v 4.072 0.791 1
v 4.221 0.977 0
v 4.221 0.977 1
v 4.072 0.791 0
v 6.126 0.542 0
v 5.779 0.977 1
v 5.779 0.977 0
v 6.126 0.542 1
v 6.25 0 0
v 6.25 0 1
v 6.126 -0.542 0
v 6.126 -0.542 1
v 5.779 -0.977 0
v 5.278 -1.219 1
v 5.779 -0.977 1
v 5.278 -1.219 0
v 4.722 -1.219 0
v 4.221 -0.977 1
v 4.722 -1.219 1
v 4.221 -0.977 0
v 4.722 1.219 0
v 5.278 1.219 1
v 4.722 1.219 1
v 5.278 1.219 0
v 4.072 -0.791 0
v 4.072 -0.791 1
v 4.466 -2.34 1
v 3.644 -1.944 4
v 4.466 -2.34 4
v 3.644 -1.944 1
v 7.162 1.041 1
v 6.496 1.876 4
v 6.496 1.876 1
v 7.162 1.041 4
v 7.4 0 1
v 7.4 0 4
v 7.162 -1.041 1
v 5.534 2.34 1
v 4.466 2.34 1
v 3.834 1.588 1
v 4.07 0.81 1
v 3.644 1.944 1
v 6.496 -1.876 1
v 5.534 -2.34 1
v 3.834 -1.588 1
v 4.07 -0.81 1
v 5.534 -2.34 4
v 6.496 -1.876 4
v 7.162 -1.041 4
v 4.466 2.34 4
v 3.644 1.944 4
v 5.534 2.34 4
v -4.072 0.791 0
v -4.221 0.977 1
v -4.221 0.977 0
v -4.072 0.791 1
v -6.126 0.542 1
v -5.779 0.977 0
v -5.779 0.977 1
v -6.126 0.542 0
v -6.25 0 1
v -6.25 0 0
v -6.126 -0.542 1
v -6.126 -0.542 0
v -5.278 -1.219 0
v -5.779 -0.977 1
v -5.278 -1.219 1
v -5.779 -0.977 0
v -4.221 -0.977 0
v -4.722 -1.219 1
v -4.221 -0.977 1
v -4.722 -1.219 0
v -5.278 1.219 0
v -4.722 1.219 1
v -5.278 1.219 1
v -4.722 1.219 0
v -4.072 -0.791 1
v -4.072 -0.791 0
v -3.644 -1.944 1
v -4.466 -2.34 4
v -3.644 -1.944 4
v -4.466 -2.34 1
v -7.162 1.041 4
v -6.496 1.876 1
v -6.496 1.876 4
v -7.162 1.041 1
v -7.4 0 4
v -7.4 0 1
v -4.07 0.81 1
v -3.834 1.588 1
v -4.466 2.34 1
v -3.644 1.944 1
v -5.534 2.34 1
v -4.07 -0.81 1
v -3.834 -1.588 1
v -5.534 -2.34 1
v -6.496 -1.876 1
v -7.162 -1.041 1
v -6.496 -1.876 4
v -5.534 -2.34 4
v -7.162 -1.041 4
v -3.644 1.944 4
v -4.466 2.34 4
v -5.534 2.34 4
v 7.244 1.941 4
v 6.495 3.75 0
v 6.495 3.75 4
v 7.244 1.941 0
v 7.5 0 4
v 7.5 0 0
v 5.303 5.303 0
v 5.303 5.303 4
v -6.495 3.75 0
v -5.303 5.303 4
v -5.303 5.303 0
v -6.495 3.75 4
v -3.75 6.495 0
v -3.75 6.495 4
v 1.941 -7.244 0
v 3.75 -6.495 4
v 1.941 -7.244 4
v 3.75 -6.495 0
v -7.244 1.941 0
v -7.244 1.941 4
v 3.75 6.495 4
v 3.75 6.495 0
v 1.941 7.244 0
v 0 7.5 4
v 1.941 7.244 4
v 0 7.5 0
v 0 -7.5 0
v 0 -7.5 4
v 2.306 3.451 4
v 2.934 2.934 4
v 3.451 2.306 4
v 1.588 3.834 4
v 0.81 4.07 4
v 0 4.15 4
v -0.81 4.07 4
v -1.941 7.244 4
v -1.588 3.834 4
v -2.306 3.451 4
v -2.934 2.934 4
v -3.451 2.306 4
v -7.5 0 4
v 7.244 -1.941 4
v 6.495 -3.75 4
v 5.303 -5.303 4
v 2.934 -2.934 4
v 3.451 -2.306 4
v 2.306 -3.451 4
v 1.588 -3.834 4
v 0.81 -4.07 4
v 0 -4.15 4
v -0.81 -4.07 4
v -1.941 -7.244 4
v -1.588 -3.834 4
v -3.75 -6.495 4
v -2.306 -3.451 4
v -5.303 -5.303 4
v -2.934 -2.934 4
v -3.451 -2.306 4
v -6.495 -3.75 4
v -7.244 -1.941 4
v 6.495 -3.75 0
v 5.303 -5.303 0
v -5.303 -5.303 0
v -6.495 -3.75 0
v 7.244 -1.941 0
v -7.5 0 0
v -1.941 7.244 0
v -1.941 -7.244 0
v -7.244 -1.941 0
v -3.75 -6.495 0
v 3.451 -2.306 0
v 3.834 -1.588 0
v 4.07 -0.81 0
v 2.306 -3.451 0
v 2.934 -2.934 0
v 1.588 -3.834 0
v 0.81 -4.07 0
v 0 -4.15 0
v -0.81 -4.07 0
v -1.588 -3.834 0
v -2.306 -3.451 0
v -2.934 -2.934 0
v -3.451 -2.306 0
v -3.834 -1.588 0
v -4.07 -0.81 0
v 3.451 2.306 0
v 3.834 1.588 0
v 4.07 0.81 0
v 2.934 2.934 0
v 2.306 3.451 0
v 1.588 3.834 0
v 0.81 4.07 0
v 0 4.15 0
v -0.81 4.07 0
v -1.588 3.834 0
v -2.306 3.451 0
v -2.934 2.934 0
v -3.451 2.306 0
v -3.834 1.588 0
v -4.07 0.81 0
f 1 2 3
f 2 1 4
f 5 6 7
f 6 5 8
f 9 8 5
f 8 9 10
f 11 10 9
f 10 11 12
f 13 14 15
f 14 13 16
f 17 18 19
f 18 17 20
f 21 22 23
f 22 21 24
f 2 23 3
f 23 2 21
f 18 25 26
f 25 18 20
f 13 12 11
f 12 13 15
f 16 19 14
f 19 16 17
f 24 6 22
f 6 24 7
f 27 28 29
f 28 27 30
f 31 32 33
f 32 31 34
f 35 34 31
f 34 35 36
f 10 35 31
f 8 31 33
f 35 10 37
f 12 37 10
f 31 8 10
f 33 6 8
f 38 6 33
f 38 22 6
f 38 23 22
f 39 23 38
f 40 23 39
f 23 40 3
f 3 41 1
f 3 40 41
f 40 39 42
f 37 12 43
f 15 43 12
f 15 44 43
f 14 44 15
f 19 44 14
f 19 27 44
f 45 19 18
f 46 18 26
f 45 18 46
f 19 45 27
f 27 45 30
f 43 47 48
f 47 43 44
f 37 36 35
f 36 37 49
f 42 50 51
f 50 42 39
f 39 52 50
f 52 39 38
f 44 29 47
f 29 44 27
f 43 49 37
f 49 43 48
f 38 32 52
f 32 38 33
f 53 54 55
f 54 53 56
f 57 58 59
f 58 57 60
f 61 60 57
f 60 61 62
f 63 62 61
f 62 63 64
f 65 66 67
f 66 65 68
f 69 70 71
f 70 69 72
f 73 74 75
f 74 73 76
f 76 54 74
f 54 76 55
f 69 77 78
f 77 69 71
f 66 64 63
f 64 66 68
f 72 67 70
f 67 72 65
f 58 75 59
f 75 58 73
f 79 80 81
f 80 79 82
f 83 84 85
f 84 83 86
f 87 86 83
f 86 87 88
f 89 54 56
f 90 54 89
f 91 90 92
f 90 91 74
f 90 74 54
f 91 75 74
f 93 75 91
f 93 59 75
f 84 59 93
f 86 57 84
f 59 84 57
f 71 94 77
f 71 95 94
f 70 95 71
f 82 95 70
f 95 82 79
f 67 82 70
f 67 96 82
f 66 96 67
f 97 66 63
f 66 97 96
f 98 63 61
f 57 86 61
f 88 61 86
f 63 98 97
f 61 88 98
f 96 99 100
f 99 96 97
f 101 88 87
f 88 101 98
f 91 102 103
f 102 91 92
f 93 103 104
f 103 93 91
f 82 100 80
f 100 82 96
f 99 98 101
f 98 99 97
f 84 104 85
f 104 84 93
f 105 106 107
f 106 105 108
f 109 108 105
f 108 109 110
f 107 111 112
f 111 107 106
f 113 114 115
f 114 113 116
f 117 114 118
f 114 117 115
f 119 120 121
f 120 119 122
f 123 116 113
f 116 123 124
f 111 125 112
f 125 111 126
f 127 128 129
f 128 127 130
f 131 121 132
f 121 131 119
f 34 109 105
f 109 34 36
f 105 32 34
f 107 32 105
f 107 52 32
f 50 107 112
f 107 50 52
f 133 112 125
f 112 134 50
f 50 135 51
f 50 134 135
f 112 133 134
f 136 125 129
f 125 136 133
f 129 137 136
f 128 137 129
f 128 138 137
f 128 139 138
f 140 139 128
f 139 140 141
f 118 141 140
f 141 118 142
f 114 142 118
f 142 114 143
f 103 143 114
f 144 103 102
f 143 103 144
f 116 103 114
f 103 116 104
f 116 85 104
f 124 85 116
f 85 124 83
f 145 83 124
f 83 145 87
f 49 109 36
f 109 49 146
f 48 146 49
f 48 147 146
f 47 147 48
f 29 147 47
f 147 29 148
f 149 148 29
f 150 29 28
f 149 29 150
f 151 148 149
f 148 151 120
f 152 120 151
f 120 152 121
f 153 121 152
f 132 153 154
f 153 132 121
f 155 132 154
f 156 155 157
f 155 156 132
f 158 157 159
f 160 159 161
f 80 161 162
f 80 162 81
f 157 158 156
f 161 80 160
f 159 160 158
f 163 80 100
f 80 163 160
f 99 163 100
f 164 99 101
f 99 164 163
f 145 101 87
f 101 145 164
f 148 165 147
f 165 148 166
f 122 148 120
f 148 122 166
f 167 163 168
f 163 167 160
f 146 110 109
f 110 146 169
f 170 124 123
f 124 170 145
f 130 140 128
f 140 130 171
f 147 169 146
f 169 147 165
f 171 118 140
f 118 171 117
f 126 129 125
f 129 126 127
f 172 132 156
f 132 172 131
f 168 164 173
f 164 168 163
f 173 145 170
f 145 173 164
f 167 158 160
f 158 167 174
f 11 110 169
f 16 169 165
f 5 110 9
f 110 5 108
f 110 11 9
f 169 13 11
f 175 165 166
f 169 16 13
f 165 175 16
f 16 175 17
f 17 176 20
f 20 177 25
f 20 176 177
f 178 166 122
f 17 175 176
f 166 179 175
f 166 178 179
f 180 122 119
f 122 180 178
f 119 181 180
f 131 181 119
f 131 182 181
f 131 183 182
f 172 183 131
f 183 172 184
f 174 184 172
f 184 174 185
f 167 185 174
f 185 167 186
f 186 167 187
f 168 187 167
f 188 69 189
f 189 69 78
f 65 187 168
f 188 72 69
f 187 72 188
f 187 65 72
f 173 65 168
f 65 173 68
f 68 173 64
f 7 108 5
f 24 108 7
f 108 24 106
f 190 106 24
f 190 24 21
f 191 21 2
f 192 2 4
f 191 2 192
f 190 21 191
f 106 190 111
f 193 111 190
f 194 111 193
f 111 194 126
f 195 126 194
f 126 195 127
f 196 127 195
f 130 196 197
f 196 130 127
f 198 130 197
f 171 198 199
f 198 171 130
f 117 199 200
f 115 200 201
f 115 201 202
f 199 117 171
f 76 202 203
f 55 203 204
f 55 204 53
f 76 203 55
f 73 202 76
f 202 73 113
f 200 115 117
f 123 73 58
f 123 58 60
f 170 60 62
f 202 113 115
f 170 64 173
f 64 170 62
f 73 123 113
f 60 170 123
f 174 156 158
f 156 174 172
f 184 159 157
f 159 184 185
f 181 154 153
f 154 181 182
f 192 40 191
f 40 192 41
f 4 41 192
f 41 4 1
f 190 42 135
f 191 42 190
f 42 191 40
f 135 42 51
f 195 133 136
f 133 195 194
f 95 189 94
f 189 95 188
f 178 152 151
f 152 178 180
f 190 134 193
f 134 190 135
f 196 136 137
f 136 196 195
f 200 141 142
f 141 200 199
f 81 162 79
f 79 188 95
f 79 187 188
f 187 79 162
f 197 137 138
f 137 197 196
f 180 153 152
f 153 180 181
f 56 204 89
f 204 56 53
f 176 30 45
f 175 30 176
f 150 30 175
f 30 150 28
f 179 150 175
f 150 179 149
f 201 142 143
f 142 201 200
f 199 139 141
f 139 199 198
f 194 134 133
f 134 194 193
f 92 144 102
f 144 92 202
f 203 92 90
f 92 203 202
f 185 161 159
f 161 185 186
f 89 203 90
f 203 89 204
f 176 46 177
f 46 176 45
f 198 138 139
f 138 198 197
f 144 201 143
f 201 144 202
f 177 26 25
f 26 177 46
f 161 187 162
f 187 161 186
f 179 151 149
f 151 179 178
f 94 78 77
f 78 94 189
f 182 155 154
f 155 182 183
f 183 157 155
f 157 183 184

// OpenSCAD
use <../../libs/illumination.scad>

condenser_led_holder_stl();

module condenser_led_holder_stl(){
    condenser_led_holder(led_r=7.8/2);
}
